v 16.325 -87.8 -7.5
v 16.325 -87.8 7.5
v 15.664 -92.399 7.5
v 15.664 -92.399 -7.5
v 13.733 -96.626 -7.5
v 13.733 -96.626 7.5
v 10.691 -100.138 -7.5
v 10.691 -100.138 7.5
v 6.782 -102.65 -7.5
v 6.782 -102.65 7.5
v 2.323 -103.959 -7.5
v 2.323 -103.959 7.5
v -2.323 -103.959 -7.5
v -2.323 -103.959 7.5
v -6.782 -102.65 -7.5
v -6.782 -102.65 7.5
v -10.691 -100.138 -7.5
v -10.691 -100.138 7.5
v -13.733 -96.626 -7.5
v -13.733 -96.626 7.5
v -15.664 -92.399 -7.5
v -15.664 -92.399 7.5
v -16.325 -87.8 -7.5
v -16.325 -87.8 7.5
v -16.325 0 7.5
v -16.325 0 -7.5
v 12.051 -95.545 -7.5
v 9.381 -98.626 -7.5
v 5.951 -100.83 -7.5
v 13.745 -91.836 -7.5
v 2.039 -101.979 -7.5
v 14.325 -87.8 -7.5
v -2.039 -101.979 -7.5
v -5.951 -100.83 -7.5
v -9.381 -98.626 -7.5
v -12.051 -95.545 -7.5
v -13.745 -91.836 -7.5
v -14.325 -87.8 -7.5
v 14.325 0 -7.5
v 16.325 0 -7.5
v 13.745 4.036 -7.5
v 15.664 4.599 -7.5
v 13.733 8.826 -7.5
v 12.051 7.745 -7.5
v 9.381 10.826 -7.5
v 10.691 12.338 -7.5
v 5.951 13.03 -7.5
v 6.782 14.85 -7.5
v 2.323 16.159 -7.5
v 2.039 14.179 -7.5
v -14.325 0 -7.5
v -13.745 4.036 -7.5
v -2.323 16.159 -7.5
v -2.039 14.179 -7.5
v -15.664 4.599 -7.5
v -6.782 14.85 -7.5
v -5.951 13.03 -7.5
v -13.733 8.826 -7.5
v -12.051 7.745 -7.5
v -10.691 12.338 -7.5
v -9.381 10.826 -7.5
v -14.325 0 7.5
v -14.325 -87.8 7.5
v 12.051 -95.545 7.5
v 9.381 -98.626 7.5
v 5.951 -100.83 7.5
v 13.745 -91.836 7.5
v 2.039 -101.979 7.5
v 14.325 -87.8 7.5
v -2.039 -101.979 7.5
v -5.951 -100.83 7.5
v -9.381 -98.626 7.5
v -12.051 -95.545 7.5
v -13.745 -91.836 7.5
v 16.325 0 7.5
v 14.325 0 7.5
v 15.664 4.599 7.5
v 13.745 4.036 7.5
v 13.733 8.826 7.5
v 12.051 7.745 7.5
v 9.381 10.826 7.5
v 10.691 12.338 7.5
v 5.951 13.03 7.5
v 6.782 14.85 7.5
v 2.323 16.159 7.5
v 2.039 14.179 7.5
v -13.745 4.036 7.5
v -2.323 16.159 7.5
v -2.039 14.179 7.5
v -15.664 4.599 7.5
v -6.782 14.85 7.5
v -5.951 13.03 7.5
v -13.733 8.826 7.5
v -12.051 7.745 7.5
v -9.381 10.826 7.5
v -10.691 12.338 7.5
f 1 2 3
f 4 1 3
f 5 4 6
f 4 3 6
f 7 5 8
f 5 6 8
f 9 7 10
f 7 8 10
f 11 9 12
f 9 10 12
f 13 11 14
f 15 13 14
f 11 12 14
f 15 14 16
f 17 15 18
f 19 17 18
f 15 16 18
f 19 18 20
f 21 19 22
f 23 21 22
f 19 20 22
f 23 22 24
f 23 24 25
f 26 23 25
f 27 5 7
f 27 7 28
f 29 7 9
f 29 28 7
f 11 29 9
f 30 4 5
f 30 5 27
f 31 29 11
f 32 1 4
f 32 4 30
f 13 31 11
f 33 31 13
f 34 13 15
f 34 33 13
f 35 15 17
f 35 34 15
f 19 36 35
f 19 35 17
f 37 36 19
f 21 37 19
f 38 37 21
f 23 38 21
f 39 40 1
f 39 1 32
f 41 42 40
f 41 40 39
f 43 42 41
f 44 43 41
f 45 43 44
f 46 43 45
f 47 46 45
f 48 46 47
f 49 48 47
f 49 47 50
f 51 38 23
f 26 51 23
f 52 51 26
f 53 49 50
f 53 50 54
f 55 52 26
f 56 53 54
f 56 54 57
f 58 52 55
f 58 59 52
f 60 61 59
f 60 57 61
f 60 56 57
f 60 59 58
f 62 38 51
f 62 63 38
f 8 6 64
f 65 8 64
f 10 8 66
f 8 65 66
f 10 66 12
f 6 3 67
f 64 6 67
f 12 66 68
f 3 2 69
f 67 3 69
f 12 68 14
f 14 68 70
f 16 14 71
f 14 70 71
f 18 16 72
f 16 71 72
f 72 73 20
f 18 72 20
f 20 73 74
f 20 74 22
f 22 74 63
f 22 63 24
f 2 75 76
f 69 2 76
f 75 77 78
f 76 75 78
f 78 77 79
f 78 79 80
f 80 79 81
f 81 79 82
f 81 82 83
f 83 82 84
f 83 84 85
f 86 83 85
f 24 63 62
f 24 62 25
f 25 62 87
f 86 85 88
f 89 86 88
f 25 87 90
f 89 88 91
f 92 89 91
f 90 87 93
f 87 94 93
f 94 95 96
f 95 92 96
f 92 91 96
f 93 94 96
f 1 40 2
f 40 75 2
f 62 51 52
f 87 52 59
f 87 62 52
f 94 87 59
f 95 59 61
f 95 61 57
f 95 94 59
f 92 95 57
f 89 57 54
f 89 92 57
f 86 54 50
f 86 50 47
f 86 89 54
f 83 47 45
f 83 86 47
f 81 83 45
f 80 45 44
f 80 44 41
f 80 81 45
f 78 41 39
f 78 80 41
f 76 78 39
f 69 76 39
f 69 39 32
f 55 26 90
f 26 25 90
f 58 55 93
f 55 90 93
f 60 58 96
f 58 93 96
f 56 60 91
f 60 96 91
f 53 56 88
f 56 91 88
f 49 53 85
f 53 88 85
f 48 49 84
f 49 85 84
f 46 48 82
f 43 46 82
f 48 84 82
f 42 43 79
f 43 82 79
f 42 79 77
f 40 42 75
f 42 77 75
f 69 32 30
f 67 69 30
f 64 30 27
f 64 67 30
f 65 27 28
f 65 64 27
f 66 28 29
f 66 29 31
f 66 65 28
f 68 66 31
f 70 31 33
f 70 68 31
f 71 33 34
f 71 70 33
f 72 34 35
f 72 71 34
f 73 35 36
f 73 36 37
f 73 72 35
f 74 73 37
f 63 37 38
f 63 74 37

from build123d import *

# Parameters (mm, degrees)
EXTRUDE_1_DEPTH = 7.5


with BuildPart() as part:
    # 草图1 → 拉伸-薄壁1 (new body, symmetric)
    with BuildSketch(Plane.XY):
        with BuildLine():
            Line((-16.325, -87.8), (-16.325, 0))
            ThreePointArc((-16.325, 0), (0, 16.325), (16.325, 0))
            Line((16.325, 0), (16.325, -87.8))
            ThreePointArc((16.325, -87.8), (0, -104.125), (-16.325, -87.8))
        make_face()
        with BuildLine():
            Line((-14.325, -87.8), (-14.325, 0))
            ThreePointArc((-14.325, 0), (0, 14.325), (14.325, 0))
            Line((14.325, 0), (14.325, -87.8))
            ThreePointArc((14.325, -87.8), (0, -102.125), (-14.325, -87.8))
        make_face(mode=Mode.SUBTRACT)
    extrude(amount=EXTRUDE_1_DEPTH, both=True)


solid = part.part
